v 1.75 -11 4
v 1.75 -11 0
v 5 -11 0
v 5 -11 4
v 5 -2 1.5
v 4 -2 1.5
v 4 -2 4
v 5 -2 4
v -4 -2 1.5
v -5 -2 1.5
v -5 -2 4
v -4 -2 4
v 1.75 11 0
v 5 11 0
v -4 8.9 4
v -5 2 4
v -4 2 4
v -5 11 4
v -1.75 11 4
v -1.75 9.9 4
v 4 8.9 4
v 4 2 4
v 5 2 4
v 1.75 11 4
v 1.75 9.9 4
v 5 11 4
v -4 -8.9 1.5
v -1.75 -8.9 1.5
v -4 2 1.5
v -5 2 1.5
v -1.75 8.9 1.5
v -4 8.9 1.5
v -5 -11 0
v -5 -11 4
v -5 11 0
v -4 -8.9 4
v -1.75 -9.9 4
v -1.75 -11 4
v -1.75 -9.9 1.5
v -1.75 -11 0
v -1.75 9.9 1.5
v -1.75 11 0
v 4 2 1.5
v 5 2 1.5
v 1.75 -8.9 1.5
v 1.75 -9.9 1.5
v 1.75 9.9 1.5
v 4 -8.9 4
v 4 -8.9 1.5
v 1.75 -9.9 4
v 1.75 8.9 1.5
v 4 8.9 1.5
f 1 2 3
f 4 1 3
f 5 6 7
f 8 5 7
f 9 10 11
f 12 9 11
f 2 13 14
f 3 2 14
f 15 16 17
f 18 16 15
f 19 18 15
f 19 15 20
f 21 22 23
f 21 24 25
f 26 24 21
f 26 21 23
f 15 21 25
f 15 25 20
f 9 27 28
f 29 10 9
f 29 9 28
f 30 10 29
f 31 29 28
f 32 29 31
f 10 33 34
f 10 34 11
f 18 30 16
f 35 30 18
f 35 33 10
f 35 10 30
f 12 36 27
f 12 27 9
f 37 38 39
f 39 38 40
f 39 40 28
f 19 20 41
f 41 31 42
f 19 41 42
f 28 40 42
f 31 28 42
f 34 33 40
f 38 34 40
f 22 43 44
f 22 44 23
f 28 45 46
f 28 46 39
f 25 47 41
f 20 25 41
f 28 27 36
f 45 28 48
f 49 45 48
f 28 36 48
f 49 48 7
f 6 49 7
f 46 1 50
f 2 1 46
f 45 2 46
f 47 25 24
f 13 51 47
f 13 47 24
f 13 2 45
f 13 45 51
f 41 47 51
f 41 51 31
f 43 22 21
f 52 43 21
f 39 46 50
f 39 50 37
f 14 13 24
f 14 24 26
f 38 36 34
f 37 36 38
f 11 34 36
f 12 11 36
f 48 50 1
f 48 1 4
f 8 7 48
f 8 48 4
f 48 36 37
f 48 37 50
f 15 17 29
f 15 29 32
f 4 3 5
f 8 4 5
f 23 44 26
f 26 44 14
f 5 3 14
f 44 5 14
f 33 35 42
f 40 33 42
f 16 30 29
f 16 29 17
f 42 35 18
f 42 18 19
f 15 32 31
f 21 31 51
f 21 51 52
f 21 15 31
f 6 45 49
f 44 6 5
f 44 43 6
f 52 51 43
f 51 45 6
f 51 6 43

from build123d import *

# Parameters (mm, degrees)
SKETCH1_W           = 10
SKETCH1_H           = 22
BOSS_EXTRUDE1_DEPTH = 4
SKETCH2_W           = 3.5
SKETCH2_H           = 22
SLOT_DEPTH          = 1.5
SKETCH3_W           = 3.5
SKETCH3_H           = 1.1
CUT_EXTRUDE2_DEPTH  = 2.5
SKETCH4_W           = 8
SKETCH4_H           = 17.8
CUT_EXTRUDE3_DEPTH  = 2.5
CUT_EXTRUDE4_REACH  = 17.395
SKETCH6_W           = 2.5
SKETCH6_H           = 4


with BuildPart() as part:
    # Sketch1 → Boss-Extrude1 (new body)
    with BuildSketch(Plane.XY):
        Rectangle(SKETCH1_W, SKETCH1_H)
    extrude(amount=BOSS_EXTRUDE1_DEPTH)

    # Sketch2 → slot (cut)
    with BuildSketch(Plane(origin=(0, 0, 0), x_dir=(-1, 0, 0), z_dir=(0, 0, -1))):
        Rectangle(SKETCH2_W, SKETCH2_H)
    extrude(amount=-SLOT_DEPTH, mode=Mode.SUBTRACT)

    # Sketch3 → Cut-Extrude2 (cut)
    with BuildSketch(Plane(origin=(0, 0, 1.5), x_dir=(-1, 0, 0), z_dir=(0, 0, -1))):
        with Locations((0, 10.45)):
            Rectangle(SKETCH3_W, SKETCH3_H)
        with Locations((0, -10.45)):
            Rectangle(SKETCH3_W, SKETCH3_H)
    extrude(amount=-CUT_EXTRUDE2_DEPTH, mode=Mode.SUBTRACT)

    # Sketch4 → Cut-Extrude3 (cut)
    with BuildSketch(Plane.XY.offset(4)):
        Rectangle(SKETCH4_W, SKETCH4_H)
    extrude(amount=-CUT_EXTRUDE3_DEPTH, mode=Mode.SUBTRACT)

    # Cut-Extrude4: up to this face of the body (flat: up to its plane)
    cut_extrude4_end = Plane(part.part.faces().sort_by_distance((5, 0, 2))[0])
    # Sketch6 → Cut-Extrude4 (cut, up to the picked face)
    with BuildSketch(Plane.ZY.offset(5), mode=Mode.PRIVATE) as cut_extrude4_sk1:
        with Locations((2.75, 0)):
            Rectangle(SKETCH6_W, SKETCH6_H)
    cut_extrude4_tool1 = split(extrude(cut_extrude4_sk1.sketch, amount=-CUT_EXTRUDE4_REACH, mode=Mode.PRIVATE), bisect_by=cut_extrude4_end, keep=Keep.BOTH, mode=Mode.PRIVATE)
    add(cut_extrude4_tool1.solids().sort_by(Axis((-5, 0, 2.75), (1, 0, 0)))[0], mode=Mode.SUBTRACT)


solid = part.part
